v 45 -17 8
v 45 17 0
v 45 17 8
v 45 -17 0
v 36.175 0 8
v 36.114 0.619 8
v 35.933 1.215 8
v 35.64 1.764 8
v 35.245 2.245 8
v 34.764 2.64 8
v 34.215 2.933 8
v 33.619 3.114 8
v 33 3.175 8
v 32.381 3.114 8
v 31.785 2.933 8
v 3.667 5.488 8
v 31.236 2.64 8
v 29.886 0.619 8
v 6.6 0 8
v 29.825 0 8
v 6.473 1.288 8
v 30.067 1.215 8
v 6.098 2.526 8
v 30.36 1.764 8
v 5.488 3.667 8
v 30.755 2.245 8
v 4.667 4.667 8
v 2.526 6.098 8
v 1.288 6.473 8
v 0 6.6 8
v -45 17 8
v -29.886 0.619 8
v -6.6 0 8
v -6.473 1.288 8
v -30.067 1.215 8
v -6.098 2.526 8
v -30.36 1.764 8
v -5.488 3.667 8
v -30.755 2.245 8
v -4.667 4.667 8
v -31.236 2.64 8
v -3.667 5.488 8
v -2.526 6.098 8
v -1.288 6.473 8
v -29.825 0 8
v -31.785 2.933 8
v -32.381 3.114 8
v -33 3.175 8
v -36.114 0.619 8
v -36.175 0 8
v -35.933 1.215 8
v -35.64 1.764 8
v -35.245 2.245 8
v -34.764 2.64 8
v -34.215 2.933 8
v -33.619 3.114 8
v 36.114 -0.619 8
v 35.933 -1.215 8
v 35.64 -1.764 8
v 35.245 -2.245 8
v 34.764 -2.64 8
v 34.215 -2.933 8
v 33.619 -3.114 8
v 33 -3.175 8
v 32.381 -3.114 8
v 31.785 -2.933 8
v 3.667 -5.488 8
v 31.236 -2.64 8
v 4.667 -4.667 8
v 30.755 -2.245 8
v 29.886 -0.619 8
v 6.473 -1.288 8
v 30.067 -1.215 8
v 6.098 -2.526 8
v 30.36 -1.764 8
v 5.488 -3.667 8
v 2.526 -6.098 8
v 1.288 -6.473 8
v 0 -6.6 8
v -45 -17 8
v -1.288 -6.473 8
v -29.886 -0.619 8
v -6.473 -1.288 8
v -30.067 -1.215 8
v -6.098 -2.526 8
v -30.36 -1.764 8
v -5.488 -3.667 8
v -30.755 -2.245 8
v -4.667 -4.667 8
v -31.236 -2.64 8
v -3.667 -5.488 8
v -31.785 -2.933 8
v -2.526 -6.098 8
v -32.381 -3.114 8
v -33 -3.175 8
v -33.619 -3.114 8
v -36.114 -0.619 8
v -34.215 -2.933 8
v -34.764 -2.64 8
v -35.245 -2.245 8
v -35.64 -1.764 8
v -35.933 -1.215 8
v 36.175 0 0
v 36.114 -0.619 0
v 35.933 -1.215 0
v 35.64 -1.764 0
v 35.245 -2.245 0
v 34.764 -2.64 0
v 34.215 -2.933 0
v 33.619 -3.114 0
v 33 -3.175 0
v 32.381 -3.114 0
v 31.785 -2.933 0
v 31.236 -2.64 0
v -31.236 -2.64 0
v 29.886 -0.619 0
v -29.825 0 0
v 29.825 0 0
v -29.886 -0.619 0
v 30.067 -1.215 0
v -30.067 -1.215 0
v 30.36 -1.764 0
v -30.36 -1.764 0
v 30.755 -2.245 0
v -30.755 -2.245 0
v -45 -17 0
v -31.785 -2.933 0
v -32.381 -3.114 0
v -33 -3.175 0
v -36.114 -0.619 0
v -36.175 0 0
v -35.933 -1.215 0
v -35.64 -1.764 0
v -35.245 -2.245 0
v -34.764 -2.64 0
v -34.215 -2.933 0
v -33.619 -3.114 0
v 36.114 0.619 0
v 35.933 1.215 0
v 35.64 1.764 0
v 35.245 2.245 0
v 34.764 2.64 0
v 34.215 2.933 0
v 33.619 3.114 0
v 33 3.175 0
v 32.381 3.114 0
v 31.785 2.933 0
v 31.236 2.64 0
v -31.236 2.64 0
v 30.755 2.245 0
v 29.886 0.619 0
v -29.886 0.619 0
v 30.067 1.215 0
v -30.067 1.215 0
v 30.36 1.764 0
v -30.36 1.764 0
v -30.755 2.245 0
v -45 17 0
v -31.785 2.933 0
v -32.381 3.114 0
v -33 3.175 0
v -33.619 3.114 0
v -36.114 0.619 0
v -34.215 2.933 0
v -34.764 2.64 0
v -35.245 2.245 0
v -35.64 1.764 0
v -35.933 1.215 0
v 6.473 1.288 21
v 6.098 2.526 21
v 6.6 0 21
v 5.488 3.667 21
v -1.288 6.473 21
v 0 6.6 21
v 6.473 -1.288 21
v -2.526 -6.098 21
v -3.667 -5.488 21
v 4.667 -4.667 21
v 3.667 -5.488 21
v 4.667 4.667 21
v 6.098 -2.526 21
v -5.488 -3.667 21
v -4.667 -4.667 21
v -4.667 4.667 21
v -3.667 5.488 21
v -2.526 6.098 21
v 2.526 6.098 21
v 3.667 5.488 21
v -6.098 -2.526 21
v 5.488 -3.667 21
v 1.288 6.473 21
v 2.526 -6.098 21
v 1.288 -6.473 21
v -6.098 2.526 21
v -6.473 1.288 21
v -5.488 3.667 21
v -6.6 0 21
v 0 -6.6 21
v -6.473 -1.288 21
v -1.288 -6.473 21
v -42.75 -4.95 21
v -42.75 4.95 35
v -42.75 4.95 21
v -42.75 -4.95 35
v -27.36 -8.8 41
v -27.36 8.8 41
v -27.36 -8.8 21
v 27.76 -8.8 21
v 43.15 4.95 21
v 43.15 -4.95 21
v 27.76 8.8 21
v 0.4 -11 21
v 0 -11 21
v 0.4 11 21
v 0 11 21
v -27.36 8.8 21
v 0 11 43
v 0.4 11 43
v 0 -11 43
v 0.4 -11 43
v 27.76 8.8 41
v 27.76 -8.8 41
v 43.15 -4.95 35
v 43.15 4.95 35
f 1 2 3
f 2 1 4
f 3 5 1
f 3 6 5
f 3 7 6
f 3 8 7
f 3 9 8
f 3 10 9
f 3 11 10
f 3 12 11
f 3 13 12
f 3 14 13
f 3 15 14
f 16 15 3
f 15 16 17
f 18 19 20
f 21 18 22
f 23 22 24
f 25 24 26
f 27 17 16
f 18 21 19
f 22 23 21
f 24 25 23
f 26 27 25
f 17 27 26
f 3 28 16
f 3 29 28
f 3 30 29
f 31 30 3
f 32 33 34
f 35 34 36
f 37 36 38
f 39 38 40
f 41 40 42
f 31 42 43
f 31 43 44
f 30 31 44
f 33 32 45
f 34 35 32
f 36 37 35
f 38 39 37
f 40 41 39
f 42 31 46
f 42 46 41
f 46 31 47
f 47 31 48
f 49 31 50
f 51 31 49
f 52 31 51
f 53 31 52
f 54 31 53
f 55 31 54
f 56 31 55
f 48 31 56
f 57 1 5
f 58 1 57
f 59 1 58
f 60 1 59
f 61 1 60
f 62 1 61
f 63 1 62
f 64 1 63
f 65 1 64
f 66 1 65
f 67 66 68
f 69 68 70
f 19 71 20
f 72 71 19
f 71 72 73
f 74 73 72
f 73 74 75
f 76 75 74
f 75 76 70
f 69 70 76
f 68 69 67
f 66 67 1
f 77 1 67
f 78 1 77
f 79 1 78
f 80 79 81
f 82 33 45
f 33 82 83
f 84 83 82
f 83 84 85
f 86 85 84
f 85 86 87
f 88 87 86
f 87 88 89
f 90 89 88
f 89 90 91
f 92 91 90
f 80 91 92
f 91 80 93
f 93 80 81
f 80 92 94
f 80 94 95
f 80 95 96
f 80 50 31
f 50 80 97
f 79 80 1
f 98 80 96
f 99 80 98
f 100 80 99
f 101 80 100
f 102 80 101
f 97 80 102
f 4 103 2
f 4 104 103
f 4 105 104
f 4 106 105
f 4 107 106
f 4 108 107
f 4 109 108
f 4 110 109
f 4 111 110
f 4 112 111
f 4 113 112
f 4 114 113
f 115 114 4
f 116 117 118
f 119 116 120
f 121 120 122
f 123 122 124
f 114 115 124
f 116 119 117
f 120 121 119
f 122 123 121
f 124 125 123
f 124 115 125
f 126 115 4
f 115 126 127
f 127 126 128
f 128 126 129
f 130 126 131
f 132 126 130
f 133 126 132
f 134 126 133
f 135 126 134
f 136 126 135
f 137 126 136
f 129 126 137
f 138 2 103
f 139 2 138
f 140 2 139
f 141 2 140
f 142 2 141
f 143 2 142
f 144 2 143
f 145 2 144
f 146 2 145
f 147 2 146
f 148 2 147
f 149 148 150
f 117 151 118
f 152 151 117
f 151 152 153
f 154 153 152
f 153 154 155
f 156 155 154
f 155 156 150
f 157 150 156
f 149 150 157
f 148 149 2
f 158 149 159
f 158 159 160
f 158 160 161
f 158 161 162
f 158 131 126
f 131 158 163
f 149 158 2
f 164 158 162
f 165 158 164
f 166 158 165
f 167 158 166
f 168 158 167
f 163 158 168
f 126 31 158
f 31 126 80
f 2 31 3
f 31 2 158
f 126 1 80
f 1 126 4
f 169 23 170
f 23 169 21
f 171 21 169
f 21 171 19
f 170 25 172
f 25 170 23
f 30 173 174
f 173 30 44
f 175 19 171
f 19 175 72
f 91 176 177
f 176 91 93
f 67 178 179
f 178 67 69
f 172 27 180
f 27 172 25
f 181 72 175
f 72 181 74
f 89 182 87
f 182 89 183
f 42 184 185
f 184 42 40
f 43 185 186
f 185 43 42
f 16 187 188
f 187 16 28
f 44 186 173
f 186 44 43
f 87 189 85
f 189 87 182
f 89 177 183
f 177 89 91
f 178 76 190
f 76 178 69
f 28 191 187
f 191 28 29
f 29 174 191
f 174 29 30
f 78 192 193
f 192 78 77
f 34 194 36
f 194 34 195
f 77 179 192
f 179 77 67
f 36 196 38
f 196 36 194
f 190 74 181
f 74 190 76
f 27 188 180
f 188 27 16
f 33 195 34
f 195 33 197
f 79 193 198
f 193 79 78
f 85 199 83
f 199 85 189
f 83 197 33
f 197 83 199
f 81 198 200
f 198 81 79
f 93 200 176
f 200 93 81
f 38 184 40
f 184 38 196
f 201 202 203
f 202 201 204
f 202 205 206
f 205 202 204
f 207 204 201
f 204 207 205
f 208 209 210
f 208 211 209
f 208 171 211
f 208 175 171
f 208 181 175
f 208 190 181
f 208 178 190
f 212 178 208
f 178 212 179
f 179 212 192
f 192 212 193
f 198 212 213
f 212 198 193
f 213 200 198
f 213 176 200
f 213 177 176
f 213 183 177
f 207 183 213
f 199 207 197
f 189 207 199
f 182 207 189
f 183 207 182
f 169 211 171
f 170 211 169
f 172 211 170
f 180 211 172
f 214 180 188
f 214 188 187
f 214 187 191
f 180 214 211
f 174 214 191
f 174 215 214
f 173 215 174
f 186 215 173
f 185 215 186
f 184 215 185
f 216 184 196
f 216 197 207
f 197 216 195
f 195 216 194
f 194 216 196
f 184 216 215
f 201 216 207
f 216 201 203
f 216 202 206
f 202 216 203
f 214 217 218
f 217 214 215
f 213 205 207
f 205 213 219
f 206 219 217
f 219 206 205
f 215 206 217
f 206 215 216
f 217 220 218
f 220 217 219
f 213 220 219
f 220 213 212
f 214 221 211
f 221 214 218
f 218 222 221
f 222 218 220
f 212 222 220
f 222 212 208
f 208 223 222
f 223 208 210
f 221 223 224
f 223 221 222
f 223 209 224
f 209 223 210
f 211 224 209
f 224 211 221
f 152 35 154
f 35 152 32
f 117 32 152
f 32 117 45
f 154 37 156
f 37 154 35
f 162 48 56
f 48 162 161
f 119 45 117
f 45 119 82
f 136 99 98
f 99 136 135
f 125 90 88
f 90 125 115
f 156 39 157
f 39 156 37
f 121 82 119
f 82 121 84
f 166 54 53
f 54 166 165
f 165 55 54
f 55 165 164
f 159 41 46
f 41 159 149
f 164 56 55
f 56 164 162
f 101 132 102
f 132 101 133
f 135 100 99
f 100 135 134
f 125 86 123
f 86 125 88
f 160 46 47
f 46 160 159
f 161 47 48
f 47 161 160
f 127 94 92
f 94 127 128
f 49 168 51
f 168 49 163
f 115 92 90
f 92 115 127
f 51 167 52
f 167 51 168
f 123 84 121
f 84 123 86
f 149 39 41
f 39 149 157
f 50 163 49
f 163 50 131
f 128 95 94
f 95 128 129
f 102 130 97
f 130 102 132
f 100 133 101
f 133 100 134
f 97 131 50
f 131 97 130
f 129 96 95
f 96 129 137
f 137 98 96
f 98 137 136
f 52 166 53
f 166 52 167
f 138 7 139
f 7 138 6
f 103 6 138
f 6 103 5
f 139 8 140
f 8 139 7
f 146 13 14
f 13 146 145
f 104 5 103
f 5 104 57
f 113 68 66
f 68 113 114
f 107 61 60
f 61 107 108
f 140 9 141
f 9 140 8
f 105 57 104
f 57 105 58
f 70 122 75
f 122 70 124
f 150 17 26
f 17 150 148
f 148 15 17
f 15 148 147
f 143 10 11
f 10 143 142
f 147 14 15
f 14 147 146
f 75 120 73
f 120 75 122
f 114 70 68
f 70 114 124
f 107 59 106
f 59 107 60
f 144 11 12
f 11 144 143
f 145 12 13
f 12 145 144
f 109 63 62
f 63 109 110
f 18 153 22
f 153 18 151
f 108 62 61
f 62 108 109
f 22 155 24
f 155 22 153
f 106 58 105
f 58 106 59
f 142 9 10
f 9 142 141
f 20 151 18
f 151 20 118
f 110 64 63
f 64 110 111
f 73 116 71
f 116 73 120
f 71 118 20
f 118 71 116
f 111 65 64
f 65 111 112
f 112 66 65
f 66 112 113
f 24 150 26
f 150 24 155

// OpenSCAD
$fn = 32;
// ----------------------------------------------------------------------
// Boat cleat: 90 mm base, horn 32 mm up
// ----------------------------------------------------------------------

// --- parameters (mm) ---
base_l = 90;              // base length
base_w = 34;              // base width
base_t = 8;               // base thickness
horn_len = 85.5;          // horn length
horn_d = 22;              // horn diameter at the middle
horn_z = 32;              // horn axis height
end_drop = 8;             // how far the horn tips drop
post_d = 13.2;            // centre post diameter
holes_d = 6.35;           // fixing holes
hole_x = 33;              // fixing hole spacing

difference() {
  union() {
    translate([-45, -17, 0]) cube([base_l, base_w, base_t]);
    /* centre post, sunk 1 mm into the base */
    translate([0, 0, 7]) cylinder(h = 25, d = post_d);
    /* horn: a hull chain of boxes, full in the middle and lighter at the tips */
    hull() {
      translate([-42.75, -4.95, 21]) cube([0.4, 9.9, 14], center = false);
      translate([-27.36, -8.8, 21]) cube([0.4, 17.6, 20], center = false);
    }
    hull() {
      translate([-27.36, -8.8, 21]) cube([0.4, 17.6, 20], center = false);
      translate([0, -11, 21]) cube([0.4, 22, 22], center = false);
    }
    hull() {
      translate([0, -11, 21]) cube([0.4, 22, 22], center = false);
      translate([27.36, -8.8, 21]) cube([0.4, 17.6, 20], center = false);
    }
    hull() {
      translate([27.36, -8.8, 21]) cube([0.4, 17.6, 20], center = false);
      translate([42.75, -4.95, 21]) cube([0.4, 9.9, 14], center = false);
    }
  }
  translate([-33, 0, -2.5]) cylinder(h = base_t + 5, d = holes_d);
  translate([33, 0, -2.5]) cylinder(h = base_t + 5, d = holes_d);
}
